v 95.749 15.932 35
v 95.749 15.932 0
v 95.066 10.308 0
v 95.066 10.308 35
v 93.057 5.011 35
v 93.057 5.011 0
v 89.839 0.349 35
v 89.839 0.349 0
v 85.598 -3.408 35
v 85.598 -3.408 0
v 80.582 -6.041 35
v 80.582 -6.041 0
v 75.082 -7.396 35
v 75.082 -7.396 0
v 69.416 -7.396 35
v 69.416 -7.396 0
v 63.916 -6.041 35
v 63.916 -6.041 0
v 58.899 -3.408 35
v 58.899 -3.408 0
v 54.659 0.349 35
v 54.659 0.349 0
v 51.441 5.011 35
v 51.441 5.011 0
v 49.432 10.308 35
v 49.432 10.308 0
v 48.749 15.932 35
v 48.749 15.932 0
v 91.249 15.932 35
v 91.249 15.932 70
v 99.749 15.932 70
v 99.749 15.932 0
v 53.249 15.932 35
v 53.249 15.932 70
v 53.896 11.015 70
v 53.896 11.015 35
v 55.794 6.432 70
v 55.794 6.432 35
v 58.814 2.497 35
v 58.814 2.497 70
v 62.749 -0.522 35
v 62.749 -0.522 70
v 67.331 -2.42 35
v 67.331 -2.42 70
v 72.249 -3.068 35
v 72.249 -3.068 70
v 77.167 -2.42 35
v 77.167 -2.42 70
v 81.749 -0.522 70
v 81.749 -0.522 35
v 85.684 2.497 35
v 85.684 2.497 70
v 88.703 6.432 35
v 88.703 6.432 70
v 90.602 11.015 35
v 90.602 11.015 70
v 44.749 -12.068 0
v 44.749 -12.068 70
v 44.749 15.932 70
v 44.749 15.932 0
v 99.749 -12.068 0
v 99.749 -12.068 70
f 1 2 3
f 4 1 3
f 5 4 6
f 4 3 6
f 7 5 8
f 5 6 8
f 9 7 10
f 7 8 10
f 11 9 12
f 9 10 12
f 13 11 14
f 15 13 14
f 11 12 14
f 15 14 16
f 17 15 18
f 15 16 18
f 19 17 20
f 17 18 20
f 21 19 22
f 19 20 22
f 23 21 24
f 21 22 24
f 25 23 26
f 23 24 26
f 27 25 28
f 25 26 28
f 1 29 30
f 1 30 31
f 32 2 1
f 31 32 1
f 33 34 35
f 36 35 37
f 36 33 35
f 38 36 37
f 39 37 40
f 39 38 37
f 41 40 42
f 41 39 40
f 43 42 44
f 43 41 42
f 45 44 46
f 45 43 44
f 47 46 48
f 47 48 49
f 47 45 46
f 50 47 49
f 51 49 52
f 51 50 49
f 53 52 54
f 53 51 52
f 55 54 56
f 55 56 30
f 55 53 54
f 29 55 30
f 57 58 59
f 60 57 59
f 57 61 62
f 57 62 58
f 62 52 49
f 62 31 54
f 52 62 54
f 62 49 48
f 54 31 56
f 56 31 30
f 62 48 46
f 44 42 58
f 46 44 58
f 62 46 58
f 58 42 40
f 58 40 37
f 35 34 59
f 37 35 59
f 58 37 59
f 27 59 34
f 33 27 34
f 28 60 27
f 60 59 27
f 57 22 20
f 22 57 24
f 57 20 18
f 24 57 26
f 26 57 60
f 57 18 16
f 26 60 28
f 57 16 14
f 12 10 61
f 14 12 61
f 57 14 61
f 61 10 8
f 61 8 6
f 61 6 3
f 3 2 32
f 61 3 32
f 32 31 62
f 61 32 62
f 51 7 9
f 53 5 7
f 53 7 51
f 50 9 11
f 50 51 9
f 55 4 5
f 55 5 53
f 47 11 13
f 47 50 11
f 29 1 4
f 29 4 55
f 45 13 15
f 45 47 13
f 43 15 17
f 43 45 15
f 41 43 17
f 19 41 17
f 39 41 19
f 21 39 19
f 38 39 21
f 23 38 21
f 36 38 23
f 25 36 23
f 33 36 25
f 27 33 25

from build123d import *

# Parameters (mm, degrees)
BOSS_EXTRUDE1_DEPTH = 35
BOSS_EXTRUDE2_DEPTH = 35


with BuildPart() as part:
    # Sketch2 → Boss-Extrude1 (new body)
    with BuildSketch(Plane.XY):
        with BuildLine():
            Line((48.748941829, 15.932254861), (44.748941829, 15.932254861))
            Line((44.748941829, 15.932254861), (44.748941829, -12.067745139))
            Line((44.748941829, -12.067745139), (99.748941829, -12.067745139))
            Line((99.748941829, -12.067745139), (99.748941829, 15.932254861))
            Line((99.748941829, 15.932254861), (95.748941829, 15.932254861))
            ThreePointArc((95.748941829, 15.932254861), (72.248941829, -7.567745139), (48.748941829, 15.932254861))
        make_face()
    extrude(amount=BOSS_EXTRUDE1_DEPTH)

    # Sketch3 → Boss-Extrude2 (add)
    with BuildSketch(Plane.XY.offset(35)):
        with BuildLine():
            Line((91.248941829, 15.932254861), (99.748941829, 15.932254861))
            Line((99.748941829, 15.932254861), (99.748941829, -12.067745139))
            Line((99.748941829, -12.067745139), (44.748941829, -12.067745139))
            Line((44.748941829, -12.067745139), (44.748941829, 15.932254861))
            Line((44.748941829, 15.932254861), (53.248941829, 15.932254861))
            ThreePointArc((53.248941829, 15.932254861), (72.248941829, -3.067745139), (91.248941829, 15.932254861))
        make_face()
    extrude(amount=BOSS_EXTRUDE2_DEPTH)


solid = part.part
